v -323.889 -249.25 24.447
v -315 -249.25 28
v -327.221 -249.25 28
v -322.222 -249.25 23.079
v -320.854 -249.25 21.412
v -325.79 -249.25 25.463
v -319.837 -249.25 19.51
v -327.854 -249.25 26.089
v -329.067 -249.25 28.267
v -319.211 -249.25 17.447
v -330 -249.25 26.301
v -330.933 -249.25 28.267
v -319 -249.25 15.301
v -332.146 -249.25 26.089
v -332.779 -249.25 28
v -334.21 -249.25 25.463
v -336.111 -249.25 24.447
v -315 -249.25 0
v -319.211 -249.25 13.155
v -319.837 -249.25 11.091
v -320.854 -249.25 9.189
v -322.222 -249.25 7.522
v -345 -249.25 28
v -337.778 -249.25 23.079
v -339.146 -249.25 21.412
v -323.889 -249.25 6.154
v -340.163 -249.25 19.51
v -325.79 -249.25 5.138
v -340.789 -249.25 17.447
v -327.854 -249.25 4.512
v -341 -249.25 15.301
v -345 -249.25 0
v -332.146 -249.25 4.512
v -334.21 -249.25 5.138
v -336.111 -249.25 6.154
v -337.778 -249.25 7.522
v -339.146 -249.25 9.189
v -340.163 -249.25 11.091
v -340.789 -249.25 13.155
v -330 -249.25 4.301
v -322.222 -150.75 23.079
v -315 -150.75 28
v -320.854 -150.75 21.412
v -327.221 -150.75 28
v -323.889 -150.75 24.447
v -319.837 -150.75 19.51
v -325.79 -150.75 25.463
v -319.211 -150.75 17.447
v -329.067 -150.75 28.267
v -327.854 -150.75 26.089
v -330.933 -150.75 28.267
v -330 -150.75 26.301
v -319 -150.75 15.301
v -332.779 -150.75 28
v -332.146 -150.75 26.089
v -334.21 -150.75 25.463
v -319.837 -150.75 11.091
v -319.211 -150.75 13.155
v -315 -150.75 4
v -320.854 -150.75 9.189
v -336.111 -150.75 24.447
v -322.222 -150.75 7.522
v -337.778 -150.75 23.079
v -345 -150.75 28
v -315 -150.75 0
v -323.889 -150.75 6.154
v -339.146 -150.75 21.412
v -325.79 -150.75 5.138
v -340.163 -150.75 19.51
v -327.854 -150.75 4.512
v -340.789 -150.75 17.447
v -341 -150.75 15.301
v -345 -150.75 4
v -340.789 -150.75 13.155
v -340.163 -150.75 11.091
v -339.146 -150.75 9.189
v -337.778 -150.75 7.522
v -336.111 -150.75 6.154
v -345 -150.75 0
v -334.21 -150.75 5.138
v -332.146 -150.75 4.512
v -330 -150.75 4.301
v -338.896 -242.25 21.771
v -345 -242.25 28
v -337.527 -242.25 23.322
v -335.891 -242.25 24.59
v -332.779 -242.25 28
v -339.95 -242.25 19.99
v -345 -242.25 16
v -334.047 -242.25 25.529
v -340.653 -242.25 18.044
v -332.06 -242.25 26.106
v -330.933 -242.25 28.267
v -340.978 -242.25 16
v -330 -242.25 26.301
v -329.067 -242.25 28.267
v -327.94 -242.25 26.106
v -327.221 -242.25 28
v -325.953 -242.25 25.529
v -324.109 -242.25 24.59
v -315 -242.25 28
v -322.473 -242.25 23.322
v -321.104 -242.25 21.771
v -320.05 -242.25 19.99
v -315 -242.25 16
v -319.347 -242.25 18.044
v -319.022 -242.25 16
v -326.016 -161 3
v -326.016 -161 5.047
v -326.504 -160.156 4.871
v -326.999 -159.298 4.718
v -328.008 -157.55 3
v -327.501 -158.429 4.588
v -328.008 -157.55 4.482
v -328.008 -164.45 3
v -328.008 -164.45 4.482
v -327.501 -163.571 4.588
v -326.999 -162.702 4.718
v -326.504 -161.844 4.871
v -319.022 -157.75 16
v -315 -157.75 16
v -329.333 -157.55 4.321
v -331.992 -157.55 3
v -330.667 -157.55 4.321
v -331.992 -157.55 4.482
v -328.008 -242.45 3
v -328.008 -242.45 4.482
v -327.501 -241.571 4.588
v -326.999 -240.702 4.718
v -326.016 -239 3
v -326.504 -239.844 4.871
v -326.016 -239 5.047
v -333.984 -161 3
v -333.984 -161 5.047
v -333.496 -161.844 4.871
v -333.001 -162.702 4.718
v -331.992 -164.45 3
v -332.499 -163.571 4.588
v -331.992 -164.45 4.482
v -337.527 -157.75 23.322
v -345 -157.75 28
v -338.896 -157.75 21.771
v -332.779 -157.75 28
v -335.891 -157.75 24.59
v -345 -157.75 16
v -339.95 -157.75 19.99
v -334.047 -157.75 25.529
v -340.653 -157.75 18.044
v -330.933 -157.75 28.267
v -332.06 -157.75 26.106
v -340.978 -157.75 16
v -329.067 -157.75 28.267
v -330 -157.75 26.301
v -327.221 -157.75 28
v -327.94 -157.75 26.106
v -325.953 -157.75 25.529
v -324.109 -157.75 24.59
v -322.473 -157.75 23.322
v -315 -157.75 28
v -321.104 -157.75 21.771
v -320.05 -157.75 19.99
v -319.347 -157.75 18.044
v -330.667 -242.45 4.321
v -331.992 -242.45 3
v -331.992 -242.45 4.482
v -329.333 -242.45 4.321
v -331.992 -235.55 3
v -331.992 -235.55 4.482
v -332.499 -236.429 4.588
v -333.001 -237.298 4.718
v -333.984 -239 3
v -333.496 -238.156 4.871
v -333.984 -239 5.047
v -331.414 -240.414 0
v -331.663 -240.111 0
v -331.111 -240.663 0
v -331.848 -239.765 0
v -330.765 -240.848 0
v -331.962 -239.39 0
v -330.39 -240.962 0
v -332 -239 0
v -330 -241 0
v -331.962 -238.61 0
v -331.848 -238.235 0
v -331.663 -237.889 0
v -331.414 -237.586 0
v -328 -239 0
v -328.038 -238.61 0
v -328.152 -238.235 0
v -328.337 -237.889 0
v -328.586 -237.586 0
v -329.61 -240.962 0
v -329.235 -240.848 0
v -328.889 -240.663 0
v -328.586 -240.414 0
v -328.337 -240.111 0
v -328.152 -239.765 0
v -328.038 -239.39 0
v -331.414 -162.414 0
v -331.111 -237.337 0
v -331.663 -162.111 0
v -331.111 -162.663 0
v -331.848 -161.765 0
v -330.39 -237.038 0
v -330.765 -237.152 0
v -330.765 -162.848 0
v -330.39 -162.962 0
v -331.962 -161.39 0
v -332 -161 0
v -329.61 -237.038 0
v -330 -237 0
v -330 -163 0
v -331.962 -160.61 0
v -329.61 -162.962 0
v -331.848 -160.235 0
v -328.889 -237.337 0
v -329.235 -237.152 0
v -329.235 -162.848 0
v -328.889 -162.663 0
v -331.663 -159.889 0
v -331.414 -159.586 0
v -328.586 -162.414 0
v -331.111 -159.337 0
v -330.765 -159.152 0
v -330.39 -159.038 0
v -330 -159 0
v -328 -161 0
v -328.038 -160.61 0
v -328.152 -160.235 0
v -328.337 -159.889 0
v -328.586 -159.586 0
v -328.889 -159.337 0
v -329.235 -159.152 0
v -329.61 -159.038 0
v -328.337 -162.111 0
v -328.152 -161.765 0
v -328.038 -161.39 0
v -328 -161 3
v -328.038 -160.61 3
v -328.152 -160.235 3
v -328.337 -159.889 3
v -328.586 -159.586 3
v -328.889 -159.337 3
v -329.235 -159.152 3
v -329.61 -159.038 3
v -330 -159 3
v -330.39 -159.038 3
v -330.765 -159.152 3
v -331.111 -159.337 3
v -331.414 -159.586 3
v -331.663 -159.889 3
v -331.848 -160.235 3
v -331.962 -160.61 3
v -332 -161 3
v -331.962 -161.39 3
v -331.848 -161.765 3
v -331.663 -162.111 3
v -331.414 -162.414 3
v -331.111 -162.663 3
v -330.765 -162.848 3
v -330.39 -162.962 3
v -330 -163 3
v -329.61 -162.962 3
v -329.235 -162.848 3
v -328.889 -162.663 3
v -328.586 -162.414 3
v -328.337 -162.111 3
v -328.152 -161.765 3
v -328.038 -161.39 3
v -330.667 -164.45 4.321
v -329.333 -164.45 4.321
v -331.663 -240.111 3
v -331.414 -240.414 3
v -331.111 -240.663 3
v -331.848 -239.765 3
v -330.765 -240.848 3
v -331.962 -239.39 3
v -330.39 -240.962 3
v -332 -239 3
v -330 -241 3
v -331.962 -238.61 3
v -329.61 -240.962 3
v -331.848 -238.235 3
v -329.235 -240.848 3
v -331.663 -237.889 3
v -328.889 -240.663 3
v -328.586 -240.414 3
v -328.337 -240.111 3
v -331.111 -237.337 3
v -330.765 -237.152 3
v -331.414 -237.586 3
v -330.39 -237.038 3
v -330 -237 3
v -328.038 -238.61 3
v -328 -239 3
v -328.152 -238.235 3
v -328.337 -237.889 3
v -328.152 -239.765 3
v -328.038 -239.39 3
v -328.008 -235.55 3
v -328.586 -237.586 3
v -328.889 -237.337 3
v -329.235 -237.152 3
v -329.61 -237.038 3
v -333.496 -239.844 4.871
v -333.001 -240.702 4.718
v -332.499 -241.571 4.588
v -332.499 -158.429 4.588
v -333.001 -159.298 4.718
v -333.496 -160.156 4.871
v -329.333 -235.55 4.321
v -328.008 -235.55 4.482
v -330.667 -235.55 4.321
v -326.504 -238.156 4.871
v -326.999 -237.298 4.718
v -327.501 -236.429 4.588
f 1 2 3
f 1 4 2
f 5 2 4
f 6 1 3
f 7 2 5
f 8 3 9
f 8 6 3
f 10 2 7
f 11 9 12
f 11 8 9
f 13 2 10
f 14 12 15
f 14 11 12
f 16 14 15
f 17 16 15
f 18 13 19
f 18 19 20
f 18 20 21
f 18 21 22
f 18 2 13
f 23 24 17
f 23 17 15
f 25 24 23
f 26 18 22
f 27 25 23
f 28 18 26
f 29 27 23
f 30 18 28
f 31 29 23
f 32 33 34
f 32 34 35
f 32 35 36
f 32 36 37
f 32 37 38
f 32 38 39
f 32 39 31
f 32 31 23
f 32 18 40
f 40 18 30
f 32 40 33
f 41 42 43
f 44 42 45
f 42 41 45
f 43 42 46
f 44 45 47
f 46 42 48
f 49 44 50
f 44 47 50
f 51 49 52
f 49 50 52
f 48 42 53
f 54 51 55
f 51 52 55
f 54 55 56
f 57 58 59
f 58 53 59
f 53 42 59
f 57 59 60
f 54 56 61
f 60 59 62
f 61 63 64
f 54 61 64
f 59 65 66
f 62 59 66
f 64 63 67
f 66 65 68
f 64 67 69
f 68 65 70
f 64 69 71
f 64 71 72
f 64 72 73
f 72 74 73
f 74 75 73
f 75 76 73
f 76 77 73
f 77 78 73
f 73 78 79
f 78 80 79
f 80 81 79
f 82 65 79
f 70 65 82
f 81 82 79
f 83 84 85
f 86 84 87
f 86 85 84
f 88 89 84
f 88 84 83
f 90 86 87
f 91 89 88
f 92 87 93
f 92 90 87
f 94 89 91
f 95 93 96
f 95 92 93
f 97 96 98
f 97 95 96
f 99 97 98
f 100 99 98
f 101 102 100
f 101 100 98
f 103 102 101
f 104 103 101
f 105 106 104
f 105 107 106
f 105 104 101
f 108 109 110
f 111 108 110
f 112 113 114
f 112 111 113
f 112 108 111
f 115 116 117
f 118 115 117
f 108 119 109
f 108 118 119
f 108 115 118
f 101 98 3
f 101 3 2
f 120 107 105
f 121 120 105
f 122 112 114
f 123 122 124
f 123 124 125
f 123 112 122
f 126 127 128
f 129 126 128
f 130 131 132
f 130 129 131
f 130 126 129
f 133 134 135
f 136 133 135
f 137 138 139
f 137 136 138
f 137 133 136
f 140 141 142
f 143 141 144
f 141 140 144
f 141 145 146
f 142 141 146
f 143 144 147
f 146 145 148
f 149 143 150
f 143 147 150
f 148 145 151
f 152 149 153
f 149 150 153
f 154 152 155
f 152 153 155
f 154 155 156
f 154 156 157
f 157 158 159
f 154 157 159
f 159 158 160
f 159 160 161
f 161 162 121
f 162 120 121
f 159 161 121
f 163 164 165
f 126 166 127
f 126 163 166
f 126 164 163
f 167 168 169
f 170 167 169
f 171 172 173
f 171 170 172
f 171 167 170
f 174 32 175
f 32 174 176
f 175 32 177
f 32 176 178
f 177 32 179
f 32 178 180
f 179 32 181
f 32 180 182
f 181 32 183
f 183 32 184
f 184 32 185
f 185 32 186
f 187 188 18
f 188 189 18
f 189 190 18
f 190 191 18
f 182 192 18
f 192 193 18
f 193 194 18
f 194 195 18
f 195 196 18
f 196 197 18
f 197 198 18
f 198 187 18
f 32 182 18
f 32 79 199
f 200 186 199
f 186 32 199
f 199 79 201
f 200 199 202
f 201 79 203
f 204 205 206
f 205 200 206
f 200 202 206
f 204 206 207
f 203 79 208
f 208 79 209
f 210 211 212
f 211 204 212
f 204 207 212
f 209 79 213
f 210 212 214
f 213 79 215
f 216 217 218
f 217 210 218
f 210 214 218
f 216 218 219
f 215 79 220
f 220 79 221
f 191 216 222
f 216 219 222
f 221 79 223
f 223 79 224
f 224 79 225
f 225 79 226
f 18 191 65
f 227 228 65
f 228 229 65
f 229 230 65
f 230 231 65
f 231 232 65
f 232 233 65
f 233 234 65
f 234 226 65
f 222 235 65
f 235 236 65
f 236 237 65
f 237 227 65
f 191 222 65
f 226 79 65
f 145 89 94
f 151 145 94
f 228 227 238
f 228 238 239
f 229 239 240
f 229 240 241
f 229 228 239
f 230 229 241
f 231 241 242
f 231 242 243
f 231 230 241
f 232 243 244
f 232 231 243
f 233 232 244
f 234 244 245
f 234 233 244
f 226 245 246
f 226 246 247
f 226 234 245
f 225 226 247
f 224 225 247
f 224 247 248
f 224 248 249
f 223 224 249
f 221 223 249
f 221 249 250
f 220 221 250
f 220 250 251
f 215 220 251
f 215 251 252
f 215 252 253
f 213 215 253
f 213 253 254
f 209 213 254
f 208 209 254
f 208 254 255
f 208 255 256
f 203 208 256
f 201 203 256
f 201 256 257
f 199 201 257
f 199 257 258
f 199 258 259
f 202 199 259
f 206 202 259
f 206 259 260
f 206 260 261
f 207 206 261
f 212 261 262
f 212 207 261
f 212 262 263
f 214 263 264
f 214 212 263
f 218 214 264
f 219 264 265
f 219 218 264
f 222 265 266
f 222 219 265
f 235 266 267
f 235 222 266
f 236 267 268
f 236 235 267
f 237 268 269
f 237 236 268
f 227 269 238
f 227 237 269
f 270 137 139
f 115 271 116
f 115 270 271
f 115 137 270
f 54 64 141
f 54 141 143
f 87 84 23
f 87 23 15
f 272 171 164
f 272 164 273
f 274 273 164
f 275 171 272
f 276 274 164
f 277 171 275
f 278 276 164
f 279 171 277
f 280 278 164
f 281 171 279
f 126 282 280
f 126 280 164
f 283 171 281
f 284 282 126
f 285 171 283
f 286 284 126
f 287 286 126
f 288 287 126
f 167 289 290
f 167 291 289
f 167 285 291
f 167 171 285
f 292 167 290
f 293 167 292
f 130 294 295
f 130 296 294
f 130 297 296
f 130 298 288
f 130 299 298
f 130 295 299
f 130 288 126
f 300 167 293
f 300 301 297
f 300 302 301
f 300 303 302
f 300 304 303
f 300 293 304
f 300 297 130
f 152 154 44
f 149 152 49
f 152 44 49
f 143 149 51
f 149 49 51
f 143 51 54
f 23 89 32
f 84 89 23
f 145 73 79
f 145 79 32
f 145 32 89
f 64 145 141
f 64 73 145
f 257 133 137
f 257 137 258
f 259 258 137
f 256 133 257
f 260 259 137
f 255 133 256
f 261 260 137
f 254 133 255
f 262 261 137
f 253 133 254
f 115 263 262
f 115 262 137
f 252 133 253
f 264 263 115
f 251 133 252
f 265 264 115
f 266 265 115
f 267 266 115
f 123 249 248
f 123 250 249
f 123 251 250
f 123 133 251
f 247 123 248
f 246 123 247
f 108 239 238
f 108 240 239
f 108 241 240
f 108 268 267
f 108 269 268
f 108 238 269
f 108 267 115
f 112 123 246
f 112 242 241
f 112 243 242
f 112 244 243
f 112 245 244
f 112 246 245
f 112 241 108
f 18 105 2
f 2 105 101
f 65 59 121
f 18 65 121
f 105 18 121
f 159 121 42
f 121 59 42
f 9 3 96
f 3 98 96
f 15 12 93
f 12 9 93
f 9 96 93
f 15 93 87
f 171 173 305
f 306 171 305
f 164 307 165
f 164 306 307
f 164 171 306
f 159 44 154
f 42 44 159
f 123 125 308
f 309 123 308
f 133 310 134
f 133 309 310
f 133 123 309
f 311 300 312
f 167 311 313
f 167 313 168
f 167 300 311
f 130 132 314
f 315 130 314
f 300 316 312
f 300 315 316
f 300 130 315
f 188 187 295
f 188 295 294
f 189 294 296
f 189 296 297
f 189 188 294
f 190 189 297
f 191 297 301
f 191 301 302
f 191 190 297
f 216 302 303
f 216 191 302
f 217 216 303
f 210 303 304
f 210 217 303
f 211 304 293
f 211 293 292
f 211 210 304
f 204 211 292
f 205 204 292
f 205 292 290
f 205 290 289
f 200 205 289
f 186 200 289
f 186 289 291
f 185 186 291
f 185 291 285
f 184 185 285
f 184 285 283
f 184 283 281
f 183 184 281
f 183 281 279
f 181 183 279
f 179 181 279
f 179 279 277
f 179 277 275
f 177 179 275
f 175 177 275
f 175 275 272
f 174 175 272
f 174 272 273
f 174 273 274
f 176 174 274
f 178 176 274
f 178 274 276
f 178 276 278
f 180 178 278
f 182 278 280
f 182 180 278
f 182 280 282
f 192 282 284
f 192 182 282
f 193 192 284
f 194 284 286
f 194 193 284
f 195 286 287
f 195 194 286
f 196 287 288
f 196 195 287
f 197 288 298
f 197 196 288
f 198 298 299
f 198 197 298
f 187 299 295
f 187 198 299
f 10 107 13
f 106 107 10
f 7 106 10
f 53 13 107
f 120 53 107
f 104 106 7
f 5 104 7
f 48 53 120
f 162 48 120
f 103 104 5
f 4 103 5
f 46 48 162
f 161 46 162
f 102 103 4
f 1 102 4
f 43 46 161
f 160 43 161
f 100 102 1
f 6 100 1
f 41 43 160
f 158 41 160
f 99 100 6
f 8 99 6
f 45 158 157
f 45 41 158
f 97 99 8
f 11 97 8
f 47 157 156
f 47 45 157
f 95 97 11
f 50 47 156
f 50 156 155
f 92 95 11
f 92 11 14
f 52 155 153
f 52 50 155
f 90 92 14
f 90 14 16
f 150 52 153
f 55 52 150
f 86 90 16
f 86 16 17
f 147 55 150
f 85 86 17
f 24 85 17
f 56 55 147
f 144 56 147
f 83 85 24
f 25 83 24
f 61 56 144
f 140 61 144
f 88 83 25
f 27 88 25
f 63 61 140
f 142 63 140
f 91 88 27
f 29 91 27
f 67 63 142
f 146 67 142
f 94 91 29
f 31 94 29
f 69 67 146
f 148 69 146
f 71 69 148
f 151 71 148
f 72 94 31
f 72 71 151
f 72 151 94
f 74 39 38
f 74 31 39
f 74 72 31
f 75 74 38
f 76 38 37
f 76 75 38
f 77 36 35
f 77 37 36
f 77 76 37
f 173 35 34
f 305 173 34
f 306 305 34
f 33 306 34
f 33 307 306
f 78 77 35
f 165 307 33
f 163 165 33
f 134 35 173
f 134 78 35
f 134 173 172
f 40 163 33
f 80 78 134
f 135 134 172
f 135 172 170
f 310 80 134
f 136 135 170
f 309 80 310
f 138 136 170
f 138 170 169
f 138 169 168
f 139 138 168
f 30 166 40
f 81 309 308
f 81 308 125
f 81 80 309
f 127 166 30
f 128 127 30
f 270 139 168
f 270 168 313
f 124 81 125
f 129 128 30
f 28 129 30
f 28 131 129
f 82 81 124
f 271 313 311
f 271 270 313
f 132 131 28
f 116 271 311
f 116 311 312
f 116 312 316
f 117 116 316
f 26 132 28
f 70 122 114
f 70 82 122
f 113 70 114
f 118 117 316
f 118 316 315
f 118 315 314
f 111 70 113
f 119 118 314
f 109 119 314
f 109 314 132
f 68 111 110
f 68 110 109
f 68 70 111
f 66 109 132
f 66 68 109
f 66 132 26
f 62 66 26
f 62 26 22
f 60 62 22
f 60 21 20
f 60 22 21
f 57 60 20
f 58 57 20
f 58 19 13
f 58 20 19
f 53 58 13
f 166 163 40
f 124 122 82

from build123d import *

# Parameters (mm, degrees)
SKETCH2_R           = 13
SKETCH2_R_2         = 11
BOSS_EXTRUDE3_DEPTH = 98.5
CUT_EXTRUDE2_START  = 7
SKETCH2_2_R         = 13
SKETCH2_2_R_2       = 11
CUT_EXTRUDE2_DEPTH  = 84.5
SKETCH1_W           = 30
SKETCH1_H           = 98.5
SKETCH1_R           = 2
BOSS_EXTRUDE5_DEPTH = 4
SKETCH3_W           = 8.573743233
SKETCH3_H           = 7
SKETCH3_W_2         = 12.852513534
SKETCH3_W_3         = 30
BOSS_EXTRUDE8_DEPTH = 24
SKETCH4_W           = 30
SKETCH4_H           = 12
BOSS_EXTRUDE9_DEPTH = 84.5
SKETCH2_3_R         = 11
CUT_EXTRUDE3_DEPTH  = 360.900226616
CUT_EXTRUDE4_START  = 3
SKETCH1_6_R         = 2
CUT_EXTRUDE4_DEPTH  = 10
SKETCH1_7_R         = 2
CUT_EXTRUDE5_DEPTH  = 427.557716632


with BuildPart() as part:
    # Sketch2 → Boss-Extrude3 (new body)
    with BuildSketch(Plane.XZ.offset(150.75)):
        with Locations(Location((-330, 15.300585116, 0), (0, 0, 180))):
            Circle(SKETCH2_R)
        with Locations(Location((-330, 15.300585116, 0), (0, 0, 242.228070503))):
            Circle(SKETCH2_R_2, mode=Mode.SUBTRACT)
    extrude(amount=BOSS_EXTRUDE3_DEPTH)

    # Sketch2<2> → Cut-Extrude2 (cut)
    with BuildSketch(Plane.XZ.offset(150.75).offset(CUT_EXTRUDE2_START)):
        with Locations((-330, 15.300585116)):
            Circle(SKETCH2_2_R)
        with Locations((-330, 15.300585116)):
            Circle(SKETCH2_2_R_2, mode=Mode.SUBTRACT)
    extrude(amount=CUT_EXTRUDE2_DEPTH, mode=Mode.SUBTRACT)


with BuildPart() as cut_extrude2_piece_1:
    # of the separate pieces the step leaves, piece 1, a body of its own (cut_extrude2_pieces)
    add(part.part.solids().sort_by_distance((-343, -150.75, 15.300585116))[0])

    # Sketch1 → Boss-Extrude5 (add)
    # profile 1 of 3: a face of its own
    with BuildSketch(Plane.XY):
        with Locations((-330, -200)):
            Rectangle(SKETCH1_W, SKETCH1_H)
        Polygon((-331.991858429, -235.55), (-333.983716857, -239), (-331.991858429, -242.45), (-328.008141571, -242.45), (-326.016283143, -239), (-328.008141571, -235.55), align=None, mode=Mode.SUBTRACT)
        Polygon((-328.008141571, -164.45), (-326.016283143, -161), (-328.008141571, -157.55), (-331.991858429, -157.55), (-333.983716857, -161), (-331.991858429, -164.45), align=None, mode=Mode.SUBTRACT)
    # profile 2 of 3: a face of its own
    with BuildSketch(Plane.XY):
        Polygon((-331.991858429, -164.45), (-328.008141571, -164.45), (-326.016283143, -161), (-328.008141571, -157.55), (-331.991858429, -157.55), (-333.983716857, -161), align=None)
        with Locations((-330, -161)):
            Circle(SKETCH1_R, mode=Mode.SUBTRACT)
    # profile 3 of 3: a face of its own
    with BuildSketch(Plane.XY):
        Polygon((-328.008141571, -235.55), (-331.991858429, -235.55), (-333.983716857, -239), (-331.991858429, -242.45), (-328.008141571, -242.45), (-326.016283143, -239), align=None)
        with Locations((-330, -239)):
            Circle(SKETCH1_R, mode=Mode.SUBTRACT)
    extrude(amount=BOSS_EXTRUDE5_DEPTH)



with BuildPart() as cut_extrude2_piece_2:
    # of the separate pieces the step leaves, piece 2, a body of its own (cut_extrude2_pieces)
    add(part.part.solids().sort_by_distance((-343, -242.25, 15.300585116))[0])


with BuildPart() as cut_extrude2_piece_1_1:
    add(cut_extrude2_piece_1.part)

    add(cut_extrude2_piece_2.part)  # Boss-Extrude8 merges Cut-Extrude2 piece 2
    # Sketch3 → Boss-Extrude8 (add)
    with BuildSketch(Plane.XY.offset(4)):
        with Locations((-340.713128384, -154.25)):
            Rectangle(SKETCH3_W, SKETCH3_H)
        with Locations((-330, -154.25)):
            Rectangle(SKETCH3_W_2, SKETCH3_H)
        with Locations((-330, -245.75)):
            Rectangle(SKETCH3_W_3, SKETCH3_H)
        with Locations((-319.286871616, -154.25)):
            Rectangle(SKETCH3_W, SKETCH3_H)
    extrude(amount=BOSS_EXTRUDE8_DEPTH)

    # Sketch4 → Boss-Extrude9 (add)
    with BuildSketch(Plane.XZ.offset(157.75)):
        with Locations((-330, 10)):
            Rectangle(SKETCH4_W, SKETCH4_H)
    extrude(amount=BOSS_EXTRUDE9_DEPTH)

    # Sketch2<3> → Cut-Extrude3 (cut, through all)
    with BuildSketch(Plane.XZ.offset(150.75)):
        with Locations((-330, 15.300585116)):
            Circle(SKETCH2_3_R)
    extrude(amount=CUT_EXTRUDE3_DEPTH, mode=Mode.SUBTRACT)

    # Sketch1<6> → Cut-Extrude4 (cut)
    # profile 1 of 2: a face of its own
    with BuildSketch(Plane.XY.offset(CUT_EXTRUDE4_START)):
        Polygon((-331.991858429, -164.45), (-328.008141571, -164.45), (-326.016283143, -161), (-328.008141571, -157.55), (-331.991858429, -157.55), (-333.983716857, -161), align=None)
        with Locations((-330, -161)):
            Circle(SKETCH1_6_R, mode=Mode.SUBTRACT)
    # profile 2 of 2: a face of its own
    with BuildSketch(Plane.XY.offset(CUT_EXTRUDE4_START)):
        Polygon((-328.008141571, -235.55), (-331.991858429, -235.55), (-333.983716857, -239), (-331.991858429, -242.45), (-328.008141571, -242.45), (-326.016283143, -239), align=None)
        with Locations((-330, -239)):
            Circle(SKETCH1_6_R, mode=Mode.SUBTRACT)
    extrude(amount=CUT_EXTRUDE4_DEPTH, mode=Mode.SUBTRACT)


with BuildPart() as cut_extrude4_piece_1:
    # of the separate pieces the step leaves, piece 1, a body of its own (cut_extrude4_pieces)
    add(cut_extrude2_piece_1_1.part.solids().sort_by_distance((-315, -249.25, 28))[0])


with BuildPart() as cut_extrude4_piece_2:
    # of the separate pieces the step leaves, piece 2, a body of its own (cut_extrude4_pieces)
    add(cut_extrude2_piece_1_1.part.solids().sort_by_distance((-328, -161, 4.48393129))[0])


with BuildPart() as cut_extrude4_piece_3:
    # of the separate pieces the step leaves, piece 3, a body of its own (cut_extrude4_pieces)
    add(cut_extrude2_piece_1_1.part.solids().sort_by_distance((-328, -239, 4.48393129))[0])


with BuildPart() as cut_extrude5_tool:
    # Sketch1<7> → Cut-Extrude5 (new, through all)
    with BuildSketch(Plane.XY):
        with Locations((-330, -161)):
            Circle(SKETCH1_7_R)
        with Locations((-330, -239)):
            Circle(SKETCH1_7_R)
    extrude(amount=CUT_EXTRUDE5_DEPTH)


with BuildPart() as cut_extrude4_piece_2_1:
    add(cut_extrude4_piece_2.part)

    # Cut-Extrude5: cut by cut_extrude5_tool
    add(cut_extrude5_tool.part, mode=Mode.SUBTRACT)


with BuildPart() as cut_extrude4_piece_3_1:
    add(cut_extrude4_piece_3.part)

    # Cut-Extrude5: cut by cut_extrude5_tool
    add(cut_extrude5_tool.part, mode=Mode.SUBTRACT)


solid = cut_extrude4_piece_1.part
